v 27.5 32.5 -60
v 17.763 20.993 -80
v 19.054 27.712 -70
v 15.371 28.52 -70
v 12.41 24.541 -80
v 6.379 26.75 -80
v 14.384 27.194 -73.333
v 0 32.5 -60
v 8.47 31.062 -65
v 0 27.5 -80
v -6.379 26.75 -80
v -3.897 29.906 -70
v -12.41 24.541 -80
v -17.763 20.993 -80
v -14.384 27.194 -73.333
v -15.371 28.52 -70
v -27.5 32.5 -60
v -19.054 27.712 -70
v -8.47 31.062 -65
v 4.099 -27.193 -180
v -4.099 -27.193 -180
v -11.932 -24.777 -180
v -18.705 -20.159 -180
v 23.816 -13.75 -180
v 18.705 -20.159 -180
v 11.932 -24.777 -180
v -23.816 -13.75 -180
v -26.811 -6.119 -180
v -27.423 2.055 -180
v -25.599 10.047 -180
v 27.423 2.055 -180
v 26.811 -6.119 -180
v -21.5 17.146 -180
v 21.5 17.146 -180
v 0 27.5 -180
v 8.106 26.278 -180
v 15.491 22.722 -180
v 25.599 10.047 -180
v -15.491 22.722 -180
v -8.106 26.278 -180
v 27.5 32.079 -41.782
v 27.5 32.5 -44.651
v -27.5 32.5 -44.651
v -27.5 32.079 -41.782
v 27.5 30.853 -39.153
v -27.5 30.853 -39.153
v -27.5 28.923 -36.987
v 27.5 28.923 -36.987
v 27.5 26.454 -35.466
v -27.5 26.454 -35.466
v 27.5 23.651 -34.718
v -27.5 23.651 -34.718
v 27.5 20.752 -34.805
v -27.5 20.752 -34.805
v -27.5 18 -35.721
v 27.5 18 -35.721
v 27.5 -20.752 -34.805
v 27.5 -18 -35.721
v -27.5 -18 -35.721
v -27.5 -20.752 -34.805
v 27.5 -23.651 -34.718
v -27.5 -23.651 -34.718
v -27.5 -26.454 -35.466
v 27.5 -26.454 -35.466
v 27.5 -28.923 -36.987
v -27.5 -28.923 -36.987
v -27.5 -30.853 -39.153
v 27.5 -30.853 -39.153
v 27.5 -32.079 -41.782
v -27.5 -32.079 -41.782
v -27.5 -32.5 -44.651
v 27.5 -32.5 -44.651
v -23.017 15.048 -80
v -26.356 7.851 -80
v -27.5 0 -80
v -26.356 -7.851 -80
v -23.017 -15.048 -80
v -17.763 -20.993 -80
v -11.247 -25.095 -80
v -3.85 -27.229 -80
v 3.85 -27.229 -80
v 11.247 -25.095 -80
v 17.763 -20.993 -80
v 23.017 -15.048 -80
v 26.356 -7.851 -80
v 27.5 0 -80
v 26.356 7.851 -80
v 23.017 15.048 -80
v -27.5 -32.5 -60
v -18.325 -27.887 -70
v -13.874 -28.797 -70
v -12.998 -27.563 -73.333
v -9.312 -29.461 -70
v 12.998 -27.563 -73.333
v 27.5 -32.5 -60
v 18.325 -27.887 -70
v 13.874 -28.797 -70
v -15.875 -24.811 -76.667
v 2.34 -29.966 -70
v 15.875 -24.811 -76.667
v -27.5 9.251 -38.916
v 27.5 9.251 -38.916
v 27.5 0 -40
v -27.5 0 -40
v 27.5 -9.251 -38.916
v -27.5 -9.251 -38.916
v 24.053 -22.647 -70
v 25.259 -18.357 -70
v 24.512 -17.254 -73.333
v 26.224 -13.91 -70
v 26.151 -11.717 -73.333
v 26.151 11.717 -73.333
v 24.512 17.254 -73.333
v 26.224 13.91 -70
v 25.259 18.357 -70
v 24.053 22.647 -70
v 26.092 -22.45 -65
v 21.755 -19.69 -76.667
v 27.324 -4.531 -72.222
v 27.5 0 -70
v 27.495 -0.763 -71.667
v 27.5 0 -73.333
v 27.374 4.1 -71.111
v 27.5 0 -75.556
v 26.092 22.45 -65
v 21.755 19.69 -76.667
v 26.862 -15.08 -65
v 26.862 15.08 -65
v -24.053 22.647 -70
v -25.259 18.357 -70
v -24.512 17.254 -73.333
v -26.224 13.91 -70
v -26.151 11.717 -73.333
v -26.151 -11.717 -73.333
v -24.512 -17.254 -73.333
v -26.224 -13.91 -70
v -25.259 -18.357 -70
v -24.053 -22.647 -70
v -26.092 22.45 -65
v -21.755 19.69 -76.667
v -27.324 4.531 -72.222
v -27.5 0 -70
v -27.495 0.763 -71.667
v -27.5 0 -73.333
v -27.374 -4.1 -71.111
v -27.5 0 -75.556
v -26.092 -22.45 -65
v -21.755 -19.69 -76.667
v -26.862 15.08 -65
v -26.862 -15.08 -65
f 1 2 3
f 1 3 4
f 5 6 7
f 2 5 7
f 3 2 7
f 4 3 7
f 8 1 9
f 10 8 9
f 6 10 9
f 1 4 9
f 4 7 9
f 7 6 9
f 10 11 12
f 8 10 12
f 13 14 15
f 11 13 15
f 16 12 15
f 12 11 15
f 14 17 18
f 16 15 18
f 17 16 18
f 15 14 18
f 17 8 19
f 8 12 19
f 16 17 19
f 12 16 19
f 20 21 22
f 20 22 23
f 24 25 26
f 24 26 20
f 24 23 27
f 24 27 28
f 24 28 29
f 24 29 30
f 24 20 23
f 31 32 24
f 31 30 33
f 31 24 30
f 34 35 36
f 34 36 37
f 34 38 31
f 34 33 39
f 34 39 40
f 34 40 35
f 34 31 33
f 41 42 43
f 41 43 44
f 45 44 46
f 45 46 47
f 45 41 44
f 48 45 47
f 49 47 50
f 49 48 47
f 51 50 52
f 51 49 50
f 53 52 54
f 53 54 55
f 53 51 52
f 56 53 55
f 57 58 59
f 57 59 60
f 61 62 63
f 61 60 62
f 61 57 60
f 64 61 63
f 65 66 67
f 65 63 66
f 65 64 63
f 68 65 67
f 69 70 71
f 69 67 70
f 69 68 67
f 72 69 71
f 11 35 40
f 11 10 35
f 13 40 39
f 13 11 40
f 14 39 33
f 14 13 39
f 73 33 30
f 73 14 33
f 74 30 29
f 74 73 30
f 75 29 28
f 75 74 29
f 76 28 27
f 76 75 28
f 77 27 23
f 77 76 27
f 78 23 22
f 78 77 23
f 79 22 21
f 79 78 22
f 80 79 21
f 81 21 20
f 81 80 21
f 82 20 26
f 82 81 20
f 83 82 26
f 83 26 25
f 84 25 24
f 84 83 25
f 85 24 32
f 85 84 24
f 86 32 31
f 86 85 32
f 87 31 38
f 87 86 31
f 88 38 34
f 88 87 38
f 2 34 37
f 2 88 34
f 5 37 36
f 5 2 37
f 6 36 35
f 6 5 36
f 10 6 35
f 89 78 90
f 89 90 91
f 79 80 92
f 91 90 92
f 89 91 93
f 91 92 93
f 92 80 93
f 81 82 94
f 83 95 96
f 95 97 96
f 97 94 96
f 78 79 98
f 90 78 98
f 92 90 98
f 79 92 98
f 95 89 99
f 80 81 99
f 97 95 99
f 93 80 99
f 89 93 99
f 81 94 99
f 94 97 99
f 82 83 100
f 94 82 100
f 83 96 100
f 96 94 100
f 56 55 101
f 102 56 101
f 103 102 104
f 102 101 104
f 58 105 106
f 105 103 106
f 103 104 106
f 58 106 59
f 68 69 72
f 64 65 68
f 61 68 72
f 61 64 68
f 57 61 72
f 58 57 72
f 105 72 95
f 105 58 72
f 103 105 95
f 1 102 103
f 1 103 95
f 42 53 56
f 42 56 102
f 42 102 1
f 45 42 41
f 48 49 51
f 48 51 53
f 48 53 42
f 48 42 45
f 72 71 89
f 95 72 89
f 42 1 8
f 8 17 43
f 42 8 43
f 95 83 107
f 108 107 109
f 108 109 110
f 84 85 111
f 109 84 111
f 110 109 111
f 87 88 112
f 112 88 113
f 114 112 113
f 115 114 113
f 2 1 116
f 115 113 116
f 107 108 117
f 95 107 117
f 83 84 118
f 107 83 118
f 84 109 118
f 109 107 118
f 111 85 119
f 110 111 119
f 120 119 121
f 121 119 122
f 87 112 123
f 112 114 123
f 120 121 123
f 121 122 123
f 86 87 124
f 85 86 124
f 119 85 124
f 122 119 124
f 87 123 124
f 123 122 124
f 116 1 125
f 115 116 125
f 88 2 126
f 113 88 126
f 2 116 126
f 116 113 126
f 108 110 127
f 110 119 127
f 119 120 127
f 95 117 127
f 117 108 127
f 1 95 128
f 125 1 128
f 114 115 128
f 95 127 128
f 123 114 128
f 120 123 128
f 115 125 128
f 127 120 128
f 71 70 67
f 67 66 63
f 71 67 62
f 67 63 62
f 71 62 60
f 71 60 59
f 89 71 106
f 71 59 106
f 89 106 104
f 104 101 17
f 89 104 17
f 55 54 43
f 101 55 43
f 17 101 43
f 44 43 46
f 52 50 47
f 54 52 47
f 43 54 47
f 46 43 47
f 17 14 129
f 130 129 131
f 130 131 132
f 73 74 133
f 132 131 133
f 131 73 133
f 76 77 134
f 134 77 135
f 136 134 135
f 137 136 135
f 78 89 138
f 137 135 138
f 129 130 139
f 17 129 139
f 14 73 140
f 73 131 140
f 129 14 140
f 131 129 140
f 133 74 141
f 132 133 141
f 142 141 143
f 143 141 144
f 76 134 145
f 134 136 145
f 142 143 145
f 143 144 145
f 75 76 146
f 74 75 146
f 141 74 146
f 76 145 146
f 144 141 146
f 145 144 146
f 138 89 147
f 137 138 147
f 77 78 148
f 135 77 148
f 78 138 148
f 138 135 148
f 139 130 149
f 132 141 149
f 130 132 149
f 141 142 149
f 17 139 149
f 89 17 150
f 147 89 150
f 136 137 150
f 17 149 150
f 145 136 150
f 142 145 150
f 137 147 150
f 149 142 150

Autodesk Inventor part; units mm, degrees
sketch "Sketch6" plane through (0, 0, 0) normal (1, 0, 0) x (0, 1, 0)
  circle A0 centre (0, 0) radius 32.5
  line L0 (-32.5, 0) -> (-32.5, -80)
  line L1 (-32.5, -80) -> (32.5, -80)
  line L2 (32.5, -80) -> (32.5, 0)
  line L3 (0, 0) -> (0, -80) construction
  line L4 (-32.5, -60) -> (32.5, -60)
  circle A1 centre (0, 0) radius 40
  point P0 (32.5, -23.3184)
  point P1 (23.3184, -32.5)
  point P2 (0, -40)
  point P3 (-32.5, -23.3184)
  dimension "d38" = 65
  dimension "d39" = 80
  dimension "d74" = 80
  dimension "d75" = 20
extrude "Extrusion8" add sketch "Sketch6" along normal mid plane 55 contours L2 L4 L0 A1
ref_plane "Work Plane2" through (0, -32.5, -80) normal (0, 0, -1) x (0, 1, 0)
ref_plane "Work Plane1" through (0, 0, 27.5) normal (0, 0, 1) x (1, 0, 0)
sketch "Sketch3" plane through (0, -32.5, -80) normal (0, 0, -1) x (0, 1, 0)
  circle A0 centre (32.5, 0) radius 27.5
  line L0 (65, -27.5) -> (65, 27.5) projected
  circle A1 centre (32.5, 0) radius 37.5
  dimension "d48" = 10
  dimension "d73" = 55
loft "Loft1" add profiles "Sketch3" section 1 edges at (0, 32.5, -60) (27.5, 0, -60) (0, -32.5, -60) (-27.5, 0, -60) contours A0
sketch "Sketch7" plane through (0, 0, 0) normal (1, 0, 0) x (0, 1, 0)
  line L0 (20.9931, -80) -> (-20.9931, -80) projected
  line L1 (0, -80) -> (0, -200)
  point P0 (0, 0)
  dimension "d52" = 120
ref_plane "Work Plane3" through (0, 0, -200) normal (0, 0, -1) x (-1, 0, 0)
extrude "Extrusion1" add sketch "Sketch3" along normal blind 100 contours A0
sketch "Sketch5" plane through (0, 0, -180) normal (0, 0, -1) x (-1, 0, 0)
  circle A0 centre (0, 0) radius 10
  point P0 (0, 0)
  dimension "d35" = 20
extrude "Extrusion7" [suppressed]
fillet "Fillet6" radius 10 2 edges at (0, -32.5, -23.3184) (0, 32.5, -23.3184)
properties part number "shank_2"
